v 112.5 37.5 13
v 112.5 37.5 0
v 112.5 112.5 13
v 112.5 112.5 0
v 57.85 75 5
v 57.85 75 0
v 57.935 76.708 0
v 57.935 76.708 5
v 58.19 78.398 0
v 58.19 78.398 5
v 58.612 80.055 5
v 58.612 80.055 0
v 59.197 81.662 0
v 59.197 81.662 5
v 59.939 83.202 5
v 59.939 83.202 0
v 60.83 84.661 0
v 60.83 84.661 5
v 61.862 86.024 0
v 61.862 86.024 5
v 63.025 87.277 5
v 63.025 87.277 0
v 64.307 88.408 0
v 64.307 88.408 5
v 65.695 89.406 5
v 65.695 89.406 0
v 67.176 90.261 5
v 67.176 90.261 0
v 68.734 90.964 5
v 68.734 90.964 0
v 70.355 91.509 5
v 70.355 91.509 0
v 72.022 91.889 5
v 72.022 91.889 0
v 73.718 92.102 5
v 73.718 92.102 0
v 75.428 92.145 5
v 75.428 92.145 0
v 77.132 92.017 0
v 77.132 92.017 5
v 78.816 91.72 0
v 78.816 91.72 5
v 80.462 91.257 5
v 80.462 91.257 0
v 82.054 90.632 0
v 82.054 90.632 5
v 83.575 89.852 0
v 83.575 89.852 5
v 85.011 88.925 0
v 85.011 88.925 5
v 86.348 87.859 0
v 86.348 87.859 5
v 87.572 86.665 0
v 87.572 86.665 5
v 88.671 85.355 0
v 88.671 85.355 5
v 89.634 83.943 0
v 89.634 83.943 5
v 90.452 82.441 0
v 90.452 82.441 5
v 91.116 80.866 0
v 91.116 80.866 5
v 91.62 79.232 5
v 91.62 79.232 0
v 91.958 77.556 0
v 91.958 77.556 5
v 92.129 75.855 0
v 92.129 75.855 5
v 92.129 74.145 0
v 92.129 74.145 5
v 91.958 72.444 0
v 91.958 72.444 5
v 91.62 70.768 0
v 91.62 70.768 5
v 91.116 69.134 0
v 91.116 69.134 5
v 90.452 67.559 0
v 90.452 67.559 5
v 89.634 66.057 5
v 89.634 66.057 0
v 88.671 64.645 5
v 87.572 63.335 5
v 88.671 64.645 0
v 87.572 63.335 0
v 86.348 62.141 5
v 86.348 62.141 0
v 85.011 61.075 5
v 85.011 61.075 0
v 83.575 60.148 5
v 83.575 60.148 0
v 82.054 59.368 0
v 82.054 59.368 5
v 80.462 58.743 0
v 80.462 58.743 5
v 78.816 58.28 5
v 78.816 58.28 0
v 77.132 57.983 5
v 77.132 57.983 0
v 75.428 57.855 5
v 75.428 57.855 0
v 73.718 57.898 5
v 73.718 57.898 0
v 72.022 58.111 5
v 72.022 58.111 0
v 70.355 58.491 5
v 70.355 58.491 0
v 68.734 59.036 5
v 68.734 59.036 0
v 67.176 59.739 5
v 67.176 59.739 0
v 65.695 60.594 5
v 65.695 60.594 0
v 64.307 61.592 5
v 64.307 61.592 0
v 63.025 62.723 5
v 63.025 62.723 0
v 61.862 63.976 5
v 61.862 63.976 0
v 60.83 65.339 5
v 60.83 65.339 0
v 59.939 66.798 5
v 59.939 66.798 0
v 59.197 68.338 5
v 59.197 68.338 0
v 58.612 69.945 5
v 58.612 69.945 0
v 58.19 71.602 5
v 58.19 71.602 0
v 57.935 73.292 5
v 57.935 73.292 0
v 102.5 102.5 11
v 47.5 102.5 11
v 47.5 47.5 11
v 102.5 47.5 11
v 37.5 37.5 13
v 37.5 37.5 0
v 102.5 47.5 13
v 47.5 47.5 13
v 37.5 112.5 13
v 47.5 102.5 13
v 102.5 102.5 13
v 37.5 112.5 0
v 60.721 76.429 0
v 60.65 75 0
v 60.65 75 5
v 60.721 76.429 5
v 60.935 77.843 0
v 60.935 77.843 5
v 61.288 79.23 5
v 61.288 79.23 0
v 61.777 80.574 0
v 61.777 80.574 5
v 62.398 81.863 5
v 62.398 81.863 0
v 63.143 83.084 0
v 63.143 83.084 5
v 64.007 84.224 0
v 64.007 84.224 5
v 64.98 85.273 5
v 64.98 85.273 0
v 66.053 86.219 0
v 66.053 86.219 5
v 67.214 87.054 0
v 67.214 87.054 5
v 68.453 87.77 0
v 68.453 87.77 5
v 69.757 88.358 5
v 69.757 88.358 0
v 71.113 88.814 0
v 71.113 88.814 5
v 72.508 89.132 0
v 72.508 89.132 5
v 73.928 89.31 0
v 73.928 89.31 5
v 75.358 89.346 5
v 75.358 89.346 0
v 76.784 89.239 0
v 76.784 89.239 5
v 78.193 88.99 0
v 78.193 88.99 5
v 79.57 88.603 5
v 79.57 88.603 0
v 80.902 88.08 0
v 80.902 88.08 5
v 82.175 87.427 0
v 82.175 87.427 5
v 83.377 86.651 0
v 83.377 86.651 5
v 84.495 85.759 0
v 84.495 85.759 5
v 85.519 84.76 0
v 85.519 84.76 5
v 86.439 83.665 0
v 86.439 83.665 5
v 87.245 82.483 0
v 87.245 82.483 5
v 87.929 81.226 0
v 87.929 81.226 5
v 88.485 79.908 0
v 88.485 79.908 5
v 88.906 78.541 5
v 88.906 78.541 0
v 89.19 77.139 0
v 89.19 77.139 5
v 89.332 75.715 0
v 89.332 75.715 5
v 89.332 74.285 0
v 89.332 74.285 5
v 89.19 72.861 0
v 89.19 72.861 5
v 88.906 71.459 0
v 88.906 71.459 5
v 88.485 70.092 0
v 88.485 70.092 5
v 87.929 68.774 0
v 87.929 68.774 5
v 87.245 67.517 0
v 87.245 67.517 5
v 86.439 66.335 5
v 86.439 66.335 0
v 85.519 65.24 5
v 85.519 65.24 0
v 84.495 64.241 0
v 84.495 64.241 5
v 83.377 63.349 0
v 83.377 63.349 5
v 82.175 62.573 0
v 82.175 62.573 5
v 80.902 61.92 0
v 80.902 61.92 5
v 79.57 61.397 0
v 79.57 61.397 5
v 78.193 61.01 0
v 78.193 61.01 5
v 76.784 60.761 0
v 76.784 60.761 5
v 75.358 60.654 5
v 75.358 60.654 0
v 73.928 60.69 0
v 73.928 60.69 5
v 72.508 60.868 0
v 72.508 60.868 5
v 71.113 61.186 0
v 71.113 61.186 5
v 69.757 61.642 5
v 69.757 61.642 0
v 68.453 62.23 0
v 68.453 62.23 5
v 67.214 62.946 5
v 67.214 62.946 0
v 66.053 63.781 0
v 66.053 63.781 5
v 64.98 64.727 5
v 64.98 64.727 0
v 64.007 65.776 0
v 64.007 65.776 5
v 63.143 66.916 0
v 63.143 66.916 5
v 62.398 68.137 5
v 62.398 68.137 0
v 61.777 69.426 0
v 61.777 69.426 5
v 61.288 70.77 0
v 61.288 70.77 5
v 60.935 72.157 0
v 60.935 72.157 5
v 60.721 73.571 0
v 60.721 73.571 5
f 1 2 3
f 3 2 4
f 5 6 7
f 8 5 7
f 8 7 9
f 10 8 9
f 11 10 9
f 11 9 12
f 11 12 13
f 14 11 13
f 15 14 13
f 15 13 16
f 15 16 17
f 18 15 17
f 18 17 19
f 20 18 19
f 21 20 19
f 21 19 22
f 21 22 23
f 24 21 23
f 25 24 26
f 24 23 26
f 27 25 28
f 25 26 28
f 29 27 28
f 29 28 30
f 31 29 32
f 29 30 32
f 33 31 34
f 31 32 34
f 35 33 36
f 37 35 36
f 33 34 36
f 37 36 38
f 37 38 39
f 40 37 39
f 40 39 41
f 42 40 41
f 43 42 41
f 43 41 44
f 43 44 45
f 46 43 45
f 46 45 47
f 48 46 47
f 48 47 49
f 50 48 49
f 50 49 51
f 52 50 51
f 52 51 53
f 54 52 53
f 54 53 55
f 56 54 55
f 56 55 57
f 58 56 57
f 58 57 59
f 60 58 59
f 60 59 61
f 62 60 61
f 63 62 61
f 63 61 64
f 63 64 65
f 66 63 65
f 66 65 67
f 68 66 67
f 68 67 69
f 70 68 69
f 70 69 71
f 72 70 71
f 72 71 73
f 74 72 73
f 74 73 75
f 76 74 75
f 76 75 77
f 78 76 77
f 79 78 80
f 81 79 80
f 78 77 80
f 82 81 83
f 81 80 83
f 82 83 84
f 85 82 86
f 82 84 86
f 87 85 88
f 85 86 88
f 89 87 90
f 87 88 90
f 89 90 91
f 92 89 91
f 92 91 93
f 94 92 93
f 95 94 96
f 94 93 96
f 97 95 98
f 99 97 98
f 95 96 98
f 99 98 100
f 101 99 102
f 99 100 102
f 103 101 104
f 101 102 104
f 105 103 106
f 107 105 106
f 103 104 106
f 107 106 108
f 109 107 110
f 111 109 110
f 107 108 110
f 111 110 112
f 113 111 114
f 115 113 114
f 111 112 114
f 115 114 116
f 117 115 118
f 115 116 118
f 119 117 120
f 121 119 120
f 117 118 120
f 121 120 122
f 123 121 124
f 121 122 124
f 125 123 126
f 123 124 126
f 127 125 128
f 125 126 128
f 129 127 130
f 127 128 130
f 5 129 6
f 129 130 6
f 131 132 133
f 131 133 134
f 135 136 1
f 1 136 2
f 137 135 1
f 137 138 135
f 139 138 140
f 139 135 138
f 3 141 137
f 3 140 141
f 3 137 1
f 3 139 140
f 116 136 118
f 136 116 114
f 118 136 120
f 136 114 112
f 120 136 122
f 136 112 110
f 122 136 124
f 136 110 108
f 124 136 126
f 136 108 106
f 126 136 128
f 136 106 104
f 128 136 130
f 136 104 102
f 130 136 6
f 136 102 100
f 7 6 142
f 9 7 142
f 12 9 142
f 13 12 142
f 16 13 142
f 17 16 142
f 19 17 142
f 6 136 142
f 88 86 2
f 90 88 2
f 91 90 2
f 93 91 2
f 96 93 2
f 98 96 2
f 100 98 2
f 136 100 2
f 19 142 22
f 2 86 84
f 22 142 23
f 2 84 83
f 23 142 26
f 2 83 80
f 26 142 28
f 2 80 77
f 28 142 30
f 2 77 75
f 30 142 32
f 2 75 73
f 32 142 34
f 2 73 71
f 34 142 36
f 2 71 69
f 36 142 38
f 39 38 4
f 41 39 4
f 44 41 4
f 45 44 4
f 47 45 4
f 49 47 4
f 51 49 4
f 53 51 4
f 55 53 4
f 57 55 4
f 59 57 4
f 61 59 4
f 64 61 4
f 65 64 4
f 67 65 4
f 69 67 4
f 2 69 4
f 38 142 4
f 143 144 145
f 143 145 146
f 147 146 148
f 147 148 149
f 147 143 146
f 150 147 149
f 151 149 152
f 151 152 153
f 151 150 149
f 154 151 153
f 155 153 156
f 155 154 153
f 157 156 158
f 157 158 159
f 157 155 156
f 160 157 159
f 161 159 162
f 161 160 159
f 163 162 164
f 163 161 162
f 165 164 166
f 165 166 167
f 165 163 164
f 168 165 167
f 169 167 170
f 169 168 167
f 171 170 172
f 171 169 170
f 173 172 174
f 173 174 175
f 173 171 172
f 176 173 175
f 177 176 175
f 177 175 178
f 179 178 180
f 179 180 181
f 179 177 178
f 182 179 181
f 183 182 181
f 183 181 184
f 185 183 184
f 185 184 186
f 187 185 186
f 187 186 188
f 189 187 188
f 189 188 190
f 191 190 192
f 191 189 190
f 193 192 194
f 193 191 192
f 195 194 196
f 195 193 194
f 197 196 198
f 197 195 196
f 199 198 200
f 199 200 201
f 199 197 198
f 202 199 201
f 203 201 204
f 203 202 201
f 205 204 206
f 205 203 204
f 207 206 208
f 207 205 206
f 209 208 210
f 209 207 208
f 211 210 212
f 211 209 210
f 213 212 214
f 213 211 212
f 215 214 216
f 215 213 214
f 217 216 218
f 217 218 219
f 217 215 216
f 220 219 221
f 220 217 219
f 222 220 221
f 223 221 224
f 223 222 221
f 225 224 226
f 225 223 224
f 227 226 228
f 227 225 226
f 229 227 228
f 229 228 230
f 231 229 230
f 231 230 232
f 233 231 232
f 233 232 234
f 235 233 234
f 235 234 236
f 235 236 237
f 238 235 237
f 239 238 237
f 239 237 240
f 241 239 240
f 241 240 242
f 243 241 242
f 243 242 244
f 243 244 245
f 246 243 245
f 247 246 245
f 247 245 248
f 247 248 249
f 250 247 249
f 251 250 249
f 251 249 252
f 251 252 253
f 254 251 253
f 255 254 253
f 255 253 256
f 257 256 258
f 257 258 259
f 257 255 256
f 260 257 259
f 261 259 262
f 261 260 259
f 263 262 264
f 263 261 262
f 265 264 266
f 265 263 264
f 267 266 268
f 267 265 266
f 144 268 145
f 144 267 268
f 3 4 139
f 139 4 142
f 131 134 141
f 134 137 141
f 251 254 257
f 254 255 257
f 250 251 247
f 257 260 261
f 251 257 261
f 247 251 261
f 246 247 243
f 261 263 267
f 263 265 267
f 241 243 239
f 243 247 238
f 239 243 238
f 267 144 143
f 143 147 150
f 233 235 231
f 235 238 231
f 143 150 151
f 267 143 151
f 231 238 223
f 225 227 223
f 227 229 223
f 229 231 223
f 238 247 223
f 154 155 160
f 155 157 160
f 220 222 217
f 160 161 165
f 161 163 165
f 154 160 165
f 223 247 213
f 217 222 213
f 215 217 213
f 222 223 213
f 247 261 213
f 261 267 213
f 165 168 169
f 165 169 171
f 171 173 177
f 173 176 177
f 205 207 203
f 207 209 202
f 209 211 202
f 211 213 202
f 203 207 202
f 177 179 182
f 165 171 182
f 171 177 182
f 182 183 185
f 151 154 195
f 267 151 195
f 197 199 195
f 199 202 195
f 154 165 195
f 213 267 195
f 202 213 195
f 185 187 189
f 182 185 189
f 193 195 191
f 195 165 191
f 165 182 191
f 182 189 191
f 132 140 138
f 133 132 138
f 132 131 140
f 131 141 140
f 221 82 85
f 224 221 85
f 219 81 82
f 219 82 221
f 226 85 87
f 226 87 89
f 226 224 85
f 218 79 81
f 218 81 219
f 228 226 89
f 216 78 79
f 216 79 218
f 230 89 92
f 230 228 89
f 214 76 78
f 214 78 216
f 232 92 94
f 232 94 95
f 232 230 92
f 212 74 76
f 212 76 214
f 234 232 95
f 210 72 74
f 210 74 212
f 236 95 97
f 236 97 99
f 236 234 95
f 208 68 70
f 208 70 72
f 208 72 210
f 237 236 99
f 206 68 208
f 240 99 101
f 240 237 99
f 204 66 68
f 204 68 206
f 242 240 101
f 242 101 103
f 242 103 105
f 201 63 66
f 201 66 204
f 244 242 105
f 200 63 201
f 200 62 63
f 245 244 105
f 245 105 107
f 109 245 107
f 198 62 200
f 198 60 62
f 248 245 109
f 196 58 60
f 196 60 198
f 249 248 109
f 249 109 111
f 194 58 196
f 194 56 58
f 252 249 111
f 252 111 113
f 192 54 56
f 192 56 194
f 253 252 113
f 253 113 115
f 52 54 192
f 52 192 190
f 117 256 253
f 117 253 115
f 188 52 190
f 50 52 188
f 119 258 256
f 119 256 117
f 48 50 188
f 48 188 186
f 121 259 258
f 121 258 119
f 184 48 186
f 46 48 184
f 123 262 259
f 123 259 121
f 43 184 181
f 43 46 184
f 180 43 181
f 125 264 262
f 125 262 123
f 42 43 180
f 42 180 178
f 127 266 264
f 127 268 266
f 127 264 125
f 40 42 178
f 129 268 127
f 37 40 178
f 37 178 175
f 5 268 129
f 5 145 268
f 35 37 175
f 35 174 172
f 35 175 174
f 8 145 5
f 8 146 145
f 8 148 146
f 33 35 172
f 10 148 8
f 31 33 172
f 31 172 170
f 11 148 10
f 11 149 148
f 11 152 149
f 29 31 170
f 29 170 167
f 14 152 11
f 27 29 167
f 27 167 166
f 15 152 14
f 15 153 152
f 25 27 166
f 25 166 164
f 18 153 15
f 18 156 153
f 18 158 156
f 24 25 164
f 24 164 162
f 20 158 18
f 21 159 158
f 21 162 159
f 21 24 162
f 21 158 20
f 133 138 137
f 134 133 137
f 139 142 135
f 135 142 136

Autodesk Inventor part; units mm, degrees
ref_plane "YZ Plane" through (0, 0, 0) normal (1, 0, 0) x (0, 1, 0)
ref_plane "XZ Plane" through (0, 0, 0) normal (0, 1, 0) x (-1, 0, 0)
ref_plane "XY Plane" through (0, 0, 0) normal (0, 0, 1) x (1, 0, 0)
sketch "Sketch4" plane through (0, 0, 0) normal (0, 0, 1) x (1, 0, 0)
  line L0 (0, 0) -> (150, 0)
  line L1 (150, 0) -> (150, 150)
  line L2 (150, 150) -> (0, 150)
  line L3 (0, 150) -> (0, 0)
  dimension "d34" = 150
  dimension "d35" = 150
extrude "Extrusion4" add sketch "Sketch4" along normal blind 10
sketch "Sketch5" plane through (0, 0, 10) normal (0, 0, 1) x (1, 0, 0)
  line L0 (10, 10) -> (140, 10)
  line L1 (140, 10) -> (140, 140)
  line L2 (140, 140) -> (10, 140)
  line L3 (10, 140) -> (10, 10)
  point P0 (0, 0)
  dimension "d38" = 130
  dimension "d39" = 130
extrude "Extrusion5" cut sketch "Sketch5" against normal blind 2
sketch "Sketch6" plane through (0, 0, 0) normal (0, 0, -1) x (-1, 0, 0)
  circle A0 centre (-75, 75) radius 14.35
  circle A1 centre (-75, 75) radius 17.15
  line L0 (-147.5, 2.5) -> (-142.5, 2.5)
  line L1 (-142.5, 2.5) -> (-142.5, 7.5)
  line L2 (-142.5, 7.5) -> (-147.5, 7.5)
  line L3 (-147.5, 7.5) -> (-147.5, 2.5)
  line L4 (-2.5, 2.5) -> (-7.5, 2.5)
  line L5 (-7.5, 2.5) -> (-7.5, 7.5)
  line L6 (-7.5, 7.5) -> (-2.5, 7.5)
  line L7 (-2.5, 7.5) -> (-2.5, 2.5)
  line L8 (-147.5, 147.5) -> (-142.5, 147.5)
  line L9 (-142.5, 147.5) -> (-142.5, 142.5)
  line L10 (-142.5, 142.5) -> (-147.5, 142.5)
  line L11 (-147.5, 142.5) -> (-147.5, 147.5)
  line L12 (-2.5, 147.5) -> (-7.5, 147.5)
  line L13 (-7.5, 147.5) -> (-7.5, 142.5)
  line L14 (-7.5, 142.5) -> (-2.5, 142.5)
  line L15 (-2.5, 142.5) -> (-2.5, 147.5)
  point P0 (0, 0)
  dimension "d42" = 28.7
  dimension "d43" = 34.3
  dimension "d46" = 5
  dimension "d47" = 5
  dimension "d48" = 5
  dimension "d49" = 5
  dimension "d50" = 5
  dimension "d51" = 5
  dimension "d52" = 5
  dimension "d53" = 5
extrude "Extrusion7" cut sketch "Sketch6" against normal blind 5
sketch "Sketch7" plane through (0, 0, 8) normal (0, 0, 1) x (1, 0, 0)
  line L0 (47.5, 102.5) -> (102.5, 102.5)
  line L1 (102.5, 102.5) -> (102.5, 47.5)
  line L2 (102.5, 47.5) -> (47.5, 47.5)
  line L3 (47.5, 47.5) -> (47.5, 102.5)
  point P0 (0, 0)
  dimension "d58" = 55
  dimension "d59" = 55
extrude "Extrusion8" cut sketch "Sketch7" against normal blind 2
sketch "Sketch8" plane through (0, 0, 10) normal (0, 0, 1) x (1, 0, 0)
  line L0 (0, 0) -> (150, 0)
  line L1 (150, 0) -> (150, 150)
  line L2 (150, 150) -> (0, 150)
  line L3 (0, 150) -> (0, 0)
  line L4 (37.5, 112.5) -> (112.5, 112.5)
  line L5 (112.5, 112.5) -> (112.5, 37.5)
  line L6 (112.5, 37.5) -> (37.5, 37.5)
  line L7 (37.5, 37.5) -> (37.5, 112.5)
  dimension "d62" = 150
  dimension "d63" = 150
  dimension "d64" = 75
  dimension "d65" = 75
extrude "Extrusion9" cut sketch "Sketch8" against normal blind 10
sketch "Sketch9" plane through (0, 0, 6) normal (0, 0, 1) x (1, 0, 0)
  line L0 (47.5, 47.5) -> (47.5, 102.5) projected
  line L1 (47.5, 47.5) -> (102.5, 47.5)
  line L2 (102.5, 47.5) -> (102.5, 102.5)
  line L3 (102.5, 102.5) -> (47.5, 102.5)
  line L4 (47.5, 102.5) -> (47.5, 47.5)
  point P0 (0, 0)
  dimension "d68" = 55
  dimension "d69" = 55
extrude "Extrusion10" add sketch "Sketch9" along normal blind 2
sketch "Sketch10" plane through (0, 0, 8) normal (0, 0, 1) x (1, 0, 0)
  line L0 (37.5, 37.5) -> (112.5, 37.5) projected
  line L1 (112.5, 37.5) -> (112.5, 112.5) projected
  line L2 (37.5, 37.5) -> (112.5, 37.5)
  line L3 (112.5, 37.5) -> (112.5, 112.5)
  line L4 (112.5, 112.5) -> (37.5, 112.5)
  line L5 (37.5, 112.5) -> (37.5, 37.5)
  point P0 (0, 0)
  dimension "d72" = 75
  dimension "d73" = 75
extrude "Extrusion11" add sketch "Sketch10" along normal blind 5
sketch "Sketch11" plane through (0, 0, 13) normal (0, 0, 1) x (1, 0, 0)
  line L0 (47.5, 47.5) -> (102.5, 47.5)
  line L1 (102.5, 47.5) -> (102.5, 102.5)
  line L2 (102.5, 102.5) -> (47.5, 102.5)
  line L3 (47.5, 102.5) -> (47.5, 47.5)
  point P0 (0, 0)
  dimension "d76" = 55
  dimension "d77" = 55
extrude "Extrusion12" cut sketch "Sketch11" against normal blind 2
sketch "Sketch12" plane through (0, 0, 11) normal (0, 0, 1) x (1, 0, 0)
  circle A0 centre (75, 75) radius 14.35
  circle A1 centre (75, 75) radius 17.15
  point P0 (0, 0)
properties part number "Elbow_Parallel_Joint"
